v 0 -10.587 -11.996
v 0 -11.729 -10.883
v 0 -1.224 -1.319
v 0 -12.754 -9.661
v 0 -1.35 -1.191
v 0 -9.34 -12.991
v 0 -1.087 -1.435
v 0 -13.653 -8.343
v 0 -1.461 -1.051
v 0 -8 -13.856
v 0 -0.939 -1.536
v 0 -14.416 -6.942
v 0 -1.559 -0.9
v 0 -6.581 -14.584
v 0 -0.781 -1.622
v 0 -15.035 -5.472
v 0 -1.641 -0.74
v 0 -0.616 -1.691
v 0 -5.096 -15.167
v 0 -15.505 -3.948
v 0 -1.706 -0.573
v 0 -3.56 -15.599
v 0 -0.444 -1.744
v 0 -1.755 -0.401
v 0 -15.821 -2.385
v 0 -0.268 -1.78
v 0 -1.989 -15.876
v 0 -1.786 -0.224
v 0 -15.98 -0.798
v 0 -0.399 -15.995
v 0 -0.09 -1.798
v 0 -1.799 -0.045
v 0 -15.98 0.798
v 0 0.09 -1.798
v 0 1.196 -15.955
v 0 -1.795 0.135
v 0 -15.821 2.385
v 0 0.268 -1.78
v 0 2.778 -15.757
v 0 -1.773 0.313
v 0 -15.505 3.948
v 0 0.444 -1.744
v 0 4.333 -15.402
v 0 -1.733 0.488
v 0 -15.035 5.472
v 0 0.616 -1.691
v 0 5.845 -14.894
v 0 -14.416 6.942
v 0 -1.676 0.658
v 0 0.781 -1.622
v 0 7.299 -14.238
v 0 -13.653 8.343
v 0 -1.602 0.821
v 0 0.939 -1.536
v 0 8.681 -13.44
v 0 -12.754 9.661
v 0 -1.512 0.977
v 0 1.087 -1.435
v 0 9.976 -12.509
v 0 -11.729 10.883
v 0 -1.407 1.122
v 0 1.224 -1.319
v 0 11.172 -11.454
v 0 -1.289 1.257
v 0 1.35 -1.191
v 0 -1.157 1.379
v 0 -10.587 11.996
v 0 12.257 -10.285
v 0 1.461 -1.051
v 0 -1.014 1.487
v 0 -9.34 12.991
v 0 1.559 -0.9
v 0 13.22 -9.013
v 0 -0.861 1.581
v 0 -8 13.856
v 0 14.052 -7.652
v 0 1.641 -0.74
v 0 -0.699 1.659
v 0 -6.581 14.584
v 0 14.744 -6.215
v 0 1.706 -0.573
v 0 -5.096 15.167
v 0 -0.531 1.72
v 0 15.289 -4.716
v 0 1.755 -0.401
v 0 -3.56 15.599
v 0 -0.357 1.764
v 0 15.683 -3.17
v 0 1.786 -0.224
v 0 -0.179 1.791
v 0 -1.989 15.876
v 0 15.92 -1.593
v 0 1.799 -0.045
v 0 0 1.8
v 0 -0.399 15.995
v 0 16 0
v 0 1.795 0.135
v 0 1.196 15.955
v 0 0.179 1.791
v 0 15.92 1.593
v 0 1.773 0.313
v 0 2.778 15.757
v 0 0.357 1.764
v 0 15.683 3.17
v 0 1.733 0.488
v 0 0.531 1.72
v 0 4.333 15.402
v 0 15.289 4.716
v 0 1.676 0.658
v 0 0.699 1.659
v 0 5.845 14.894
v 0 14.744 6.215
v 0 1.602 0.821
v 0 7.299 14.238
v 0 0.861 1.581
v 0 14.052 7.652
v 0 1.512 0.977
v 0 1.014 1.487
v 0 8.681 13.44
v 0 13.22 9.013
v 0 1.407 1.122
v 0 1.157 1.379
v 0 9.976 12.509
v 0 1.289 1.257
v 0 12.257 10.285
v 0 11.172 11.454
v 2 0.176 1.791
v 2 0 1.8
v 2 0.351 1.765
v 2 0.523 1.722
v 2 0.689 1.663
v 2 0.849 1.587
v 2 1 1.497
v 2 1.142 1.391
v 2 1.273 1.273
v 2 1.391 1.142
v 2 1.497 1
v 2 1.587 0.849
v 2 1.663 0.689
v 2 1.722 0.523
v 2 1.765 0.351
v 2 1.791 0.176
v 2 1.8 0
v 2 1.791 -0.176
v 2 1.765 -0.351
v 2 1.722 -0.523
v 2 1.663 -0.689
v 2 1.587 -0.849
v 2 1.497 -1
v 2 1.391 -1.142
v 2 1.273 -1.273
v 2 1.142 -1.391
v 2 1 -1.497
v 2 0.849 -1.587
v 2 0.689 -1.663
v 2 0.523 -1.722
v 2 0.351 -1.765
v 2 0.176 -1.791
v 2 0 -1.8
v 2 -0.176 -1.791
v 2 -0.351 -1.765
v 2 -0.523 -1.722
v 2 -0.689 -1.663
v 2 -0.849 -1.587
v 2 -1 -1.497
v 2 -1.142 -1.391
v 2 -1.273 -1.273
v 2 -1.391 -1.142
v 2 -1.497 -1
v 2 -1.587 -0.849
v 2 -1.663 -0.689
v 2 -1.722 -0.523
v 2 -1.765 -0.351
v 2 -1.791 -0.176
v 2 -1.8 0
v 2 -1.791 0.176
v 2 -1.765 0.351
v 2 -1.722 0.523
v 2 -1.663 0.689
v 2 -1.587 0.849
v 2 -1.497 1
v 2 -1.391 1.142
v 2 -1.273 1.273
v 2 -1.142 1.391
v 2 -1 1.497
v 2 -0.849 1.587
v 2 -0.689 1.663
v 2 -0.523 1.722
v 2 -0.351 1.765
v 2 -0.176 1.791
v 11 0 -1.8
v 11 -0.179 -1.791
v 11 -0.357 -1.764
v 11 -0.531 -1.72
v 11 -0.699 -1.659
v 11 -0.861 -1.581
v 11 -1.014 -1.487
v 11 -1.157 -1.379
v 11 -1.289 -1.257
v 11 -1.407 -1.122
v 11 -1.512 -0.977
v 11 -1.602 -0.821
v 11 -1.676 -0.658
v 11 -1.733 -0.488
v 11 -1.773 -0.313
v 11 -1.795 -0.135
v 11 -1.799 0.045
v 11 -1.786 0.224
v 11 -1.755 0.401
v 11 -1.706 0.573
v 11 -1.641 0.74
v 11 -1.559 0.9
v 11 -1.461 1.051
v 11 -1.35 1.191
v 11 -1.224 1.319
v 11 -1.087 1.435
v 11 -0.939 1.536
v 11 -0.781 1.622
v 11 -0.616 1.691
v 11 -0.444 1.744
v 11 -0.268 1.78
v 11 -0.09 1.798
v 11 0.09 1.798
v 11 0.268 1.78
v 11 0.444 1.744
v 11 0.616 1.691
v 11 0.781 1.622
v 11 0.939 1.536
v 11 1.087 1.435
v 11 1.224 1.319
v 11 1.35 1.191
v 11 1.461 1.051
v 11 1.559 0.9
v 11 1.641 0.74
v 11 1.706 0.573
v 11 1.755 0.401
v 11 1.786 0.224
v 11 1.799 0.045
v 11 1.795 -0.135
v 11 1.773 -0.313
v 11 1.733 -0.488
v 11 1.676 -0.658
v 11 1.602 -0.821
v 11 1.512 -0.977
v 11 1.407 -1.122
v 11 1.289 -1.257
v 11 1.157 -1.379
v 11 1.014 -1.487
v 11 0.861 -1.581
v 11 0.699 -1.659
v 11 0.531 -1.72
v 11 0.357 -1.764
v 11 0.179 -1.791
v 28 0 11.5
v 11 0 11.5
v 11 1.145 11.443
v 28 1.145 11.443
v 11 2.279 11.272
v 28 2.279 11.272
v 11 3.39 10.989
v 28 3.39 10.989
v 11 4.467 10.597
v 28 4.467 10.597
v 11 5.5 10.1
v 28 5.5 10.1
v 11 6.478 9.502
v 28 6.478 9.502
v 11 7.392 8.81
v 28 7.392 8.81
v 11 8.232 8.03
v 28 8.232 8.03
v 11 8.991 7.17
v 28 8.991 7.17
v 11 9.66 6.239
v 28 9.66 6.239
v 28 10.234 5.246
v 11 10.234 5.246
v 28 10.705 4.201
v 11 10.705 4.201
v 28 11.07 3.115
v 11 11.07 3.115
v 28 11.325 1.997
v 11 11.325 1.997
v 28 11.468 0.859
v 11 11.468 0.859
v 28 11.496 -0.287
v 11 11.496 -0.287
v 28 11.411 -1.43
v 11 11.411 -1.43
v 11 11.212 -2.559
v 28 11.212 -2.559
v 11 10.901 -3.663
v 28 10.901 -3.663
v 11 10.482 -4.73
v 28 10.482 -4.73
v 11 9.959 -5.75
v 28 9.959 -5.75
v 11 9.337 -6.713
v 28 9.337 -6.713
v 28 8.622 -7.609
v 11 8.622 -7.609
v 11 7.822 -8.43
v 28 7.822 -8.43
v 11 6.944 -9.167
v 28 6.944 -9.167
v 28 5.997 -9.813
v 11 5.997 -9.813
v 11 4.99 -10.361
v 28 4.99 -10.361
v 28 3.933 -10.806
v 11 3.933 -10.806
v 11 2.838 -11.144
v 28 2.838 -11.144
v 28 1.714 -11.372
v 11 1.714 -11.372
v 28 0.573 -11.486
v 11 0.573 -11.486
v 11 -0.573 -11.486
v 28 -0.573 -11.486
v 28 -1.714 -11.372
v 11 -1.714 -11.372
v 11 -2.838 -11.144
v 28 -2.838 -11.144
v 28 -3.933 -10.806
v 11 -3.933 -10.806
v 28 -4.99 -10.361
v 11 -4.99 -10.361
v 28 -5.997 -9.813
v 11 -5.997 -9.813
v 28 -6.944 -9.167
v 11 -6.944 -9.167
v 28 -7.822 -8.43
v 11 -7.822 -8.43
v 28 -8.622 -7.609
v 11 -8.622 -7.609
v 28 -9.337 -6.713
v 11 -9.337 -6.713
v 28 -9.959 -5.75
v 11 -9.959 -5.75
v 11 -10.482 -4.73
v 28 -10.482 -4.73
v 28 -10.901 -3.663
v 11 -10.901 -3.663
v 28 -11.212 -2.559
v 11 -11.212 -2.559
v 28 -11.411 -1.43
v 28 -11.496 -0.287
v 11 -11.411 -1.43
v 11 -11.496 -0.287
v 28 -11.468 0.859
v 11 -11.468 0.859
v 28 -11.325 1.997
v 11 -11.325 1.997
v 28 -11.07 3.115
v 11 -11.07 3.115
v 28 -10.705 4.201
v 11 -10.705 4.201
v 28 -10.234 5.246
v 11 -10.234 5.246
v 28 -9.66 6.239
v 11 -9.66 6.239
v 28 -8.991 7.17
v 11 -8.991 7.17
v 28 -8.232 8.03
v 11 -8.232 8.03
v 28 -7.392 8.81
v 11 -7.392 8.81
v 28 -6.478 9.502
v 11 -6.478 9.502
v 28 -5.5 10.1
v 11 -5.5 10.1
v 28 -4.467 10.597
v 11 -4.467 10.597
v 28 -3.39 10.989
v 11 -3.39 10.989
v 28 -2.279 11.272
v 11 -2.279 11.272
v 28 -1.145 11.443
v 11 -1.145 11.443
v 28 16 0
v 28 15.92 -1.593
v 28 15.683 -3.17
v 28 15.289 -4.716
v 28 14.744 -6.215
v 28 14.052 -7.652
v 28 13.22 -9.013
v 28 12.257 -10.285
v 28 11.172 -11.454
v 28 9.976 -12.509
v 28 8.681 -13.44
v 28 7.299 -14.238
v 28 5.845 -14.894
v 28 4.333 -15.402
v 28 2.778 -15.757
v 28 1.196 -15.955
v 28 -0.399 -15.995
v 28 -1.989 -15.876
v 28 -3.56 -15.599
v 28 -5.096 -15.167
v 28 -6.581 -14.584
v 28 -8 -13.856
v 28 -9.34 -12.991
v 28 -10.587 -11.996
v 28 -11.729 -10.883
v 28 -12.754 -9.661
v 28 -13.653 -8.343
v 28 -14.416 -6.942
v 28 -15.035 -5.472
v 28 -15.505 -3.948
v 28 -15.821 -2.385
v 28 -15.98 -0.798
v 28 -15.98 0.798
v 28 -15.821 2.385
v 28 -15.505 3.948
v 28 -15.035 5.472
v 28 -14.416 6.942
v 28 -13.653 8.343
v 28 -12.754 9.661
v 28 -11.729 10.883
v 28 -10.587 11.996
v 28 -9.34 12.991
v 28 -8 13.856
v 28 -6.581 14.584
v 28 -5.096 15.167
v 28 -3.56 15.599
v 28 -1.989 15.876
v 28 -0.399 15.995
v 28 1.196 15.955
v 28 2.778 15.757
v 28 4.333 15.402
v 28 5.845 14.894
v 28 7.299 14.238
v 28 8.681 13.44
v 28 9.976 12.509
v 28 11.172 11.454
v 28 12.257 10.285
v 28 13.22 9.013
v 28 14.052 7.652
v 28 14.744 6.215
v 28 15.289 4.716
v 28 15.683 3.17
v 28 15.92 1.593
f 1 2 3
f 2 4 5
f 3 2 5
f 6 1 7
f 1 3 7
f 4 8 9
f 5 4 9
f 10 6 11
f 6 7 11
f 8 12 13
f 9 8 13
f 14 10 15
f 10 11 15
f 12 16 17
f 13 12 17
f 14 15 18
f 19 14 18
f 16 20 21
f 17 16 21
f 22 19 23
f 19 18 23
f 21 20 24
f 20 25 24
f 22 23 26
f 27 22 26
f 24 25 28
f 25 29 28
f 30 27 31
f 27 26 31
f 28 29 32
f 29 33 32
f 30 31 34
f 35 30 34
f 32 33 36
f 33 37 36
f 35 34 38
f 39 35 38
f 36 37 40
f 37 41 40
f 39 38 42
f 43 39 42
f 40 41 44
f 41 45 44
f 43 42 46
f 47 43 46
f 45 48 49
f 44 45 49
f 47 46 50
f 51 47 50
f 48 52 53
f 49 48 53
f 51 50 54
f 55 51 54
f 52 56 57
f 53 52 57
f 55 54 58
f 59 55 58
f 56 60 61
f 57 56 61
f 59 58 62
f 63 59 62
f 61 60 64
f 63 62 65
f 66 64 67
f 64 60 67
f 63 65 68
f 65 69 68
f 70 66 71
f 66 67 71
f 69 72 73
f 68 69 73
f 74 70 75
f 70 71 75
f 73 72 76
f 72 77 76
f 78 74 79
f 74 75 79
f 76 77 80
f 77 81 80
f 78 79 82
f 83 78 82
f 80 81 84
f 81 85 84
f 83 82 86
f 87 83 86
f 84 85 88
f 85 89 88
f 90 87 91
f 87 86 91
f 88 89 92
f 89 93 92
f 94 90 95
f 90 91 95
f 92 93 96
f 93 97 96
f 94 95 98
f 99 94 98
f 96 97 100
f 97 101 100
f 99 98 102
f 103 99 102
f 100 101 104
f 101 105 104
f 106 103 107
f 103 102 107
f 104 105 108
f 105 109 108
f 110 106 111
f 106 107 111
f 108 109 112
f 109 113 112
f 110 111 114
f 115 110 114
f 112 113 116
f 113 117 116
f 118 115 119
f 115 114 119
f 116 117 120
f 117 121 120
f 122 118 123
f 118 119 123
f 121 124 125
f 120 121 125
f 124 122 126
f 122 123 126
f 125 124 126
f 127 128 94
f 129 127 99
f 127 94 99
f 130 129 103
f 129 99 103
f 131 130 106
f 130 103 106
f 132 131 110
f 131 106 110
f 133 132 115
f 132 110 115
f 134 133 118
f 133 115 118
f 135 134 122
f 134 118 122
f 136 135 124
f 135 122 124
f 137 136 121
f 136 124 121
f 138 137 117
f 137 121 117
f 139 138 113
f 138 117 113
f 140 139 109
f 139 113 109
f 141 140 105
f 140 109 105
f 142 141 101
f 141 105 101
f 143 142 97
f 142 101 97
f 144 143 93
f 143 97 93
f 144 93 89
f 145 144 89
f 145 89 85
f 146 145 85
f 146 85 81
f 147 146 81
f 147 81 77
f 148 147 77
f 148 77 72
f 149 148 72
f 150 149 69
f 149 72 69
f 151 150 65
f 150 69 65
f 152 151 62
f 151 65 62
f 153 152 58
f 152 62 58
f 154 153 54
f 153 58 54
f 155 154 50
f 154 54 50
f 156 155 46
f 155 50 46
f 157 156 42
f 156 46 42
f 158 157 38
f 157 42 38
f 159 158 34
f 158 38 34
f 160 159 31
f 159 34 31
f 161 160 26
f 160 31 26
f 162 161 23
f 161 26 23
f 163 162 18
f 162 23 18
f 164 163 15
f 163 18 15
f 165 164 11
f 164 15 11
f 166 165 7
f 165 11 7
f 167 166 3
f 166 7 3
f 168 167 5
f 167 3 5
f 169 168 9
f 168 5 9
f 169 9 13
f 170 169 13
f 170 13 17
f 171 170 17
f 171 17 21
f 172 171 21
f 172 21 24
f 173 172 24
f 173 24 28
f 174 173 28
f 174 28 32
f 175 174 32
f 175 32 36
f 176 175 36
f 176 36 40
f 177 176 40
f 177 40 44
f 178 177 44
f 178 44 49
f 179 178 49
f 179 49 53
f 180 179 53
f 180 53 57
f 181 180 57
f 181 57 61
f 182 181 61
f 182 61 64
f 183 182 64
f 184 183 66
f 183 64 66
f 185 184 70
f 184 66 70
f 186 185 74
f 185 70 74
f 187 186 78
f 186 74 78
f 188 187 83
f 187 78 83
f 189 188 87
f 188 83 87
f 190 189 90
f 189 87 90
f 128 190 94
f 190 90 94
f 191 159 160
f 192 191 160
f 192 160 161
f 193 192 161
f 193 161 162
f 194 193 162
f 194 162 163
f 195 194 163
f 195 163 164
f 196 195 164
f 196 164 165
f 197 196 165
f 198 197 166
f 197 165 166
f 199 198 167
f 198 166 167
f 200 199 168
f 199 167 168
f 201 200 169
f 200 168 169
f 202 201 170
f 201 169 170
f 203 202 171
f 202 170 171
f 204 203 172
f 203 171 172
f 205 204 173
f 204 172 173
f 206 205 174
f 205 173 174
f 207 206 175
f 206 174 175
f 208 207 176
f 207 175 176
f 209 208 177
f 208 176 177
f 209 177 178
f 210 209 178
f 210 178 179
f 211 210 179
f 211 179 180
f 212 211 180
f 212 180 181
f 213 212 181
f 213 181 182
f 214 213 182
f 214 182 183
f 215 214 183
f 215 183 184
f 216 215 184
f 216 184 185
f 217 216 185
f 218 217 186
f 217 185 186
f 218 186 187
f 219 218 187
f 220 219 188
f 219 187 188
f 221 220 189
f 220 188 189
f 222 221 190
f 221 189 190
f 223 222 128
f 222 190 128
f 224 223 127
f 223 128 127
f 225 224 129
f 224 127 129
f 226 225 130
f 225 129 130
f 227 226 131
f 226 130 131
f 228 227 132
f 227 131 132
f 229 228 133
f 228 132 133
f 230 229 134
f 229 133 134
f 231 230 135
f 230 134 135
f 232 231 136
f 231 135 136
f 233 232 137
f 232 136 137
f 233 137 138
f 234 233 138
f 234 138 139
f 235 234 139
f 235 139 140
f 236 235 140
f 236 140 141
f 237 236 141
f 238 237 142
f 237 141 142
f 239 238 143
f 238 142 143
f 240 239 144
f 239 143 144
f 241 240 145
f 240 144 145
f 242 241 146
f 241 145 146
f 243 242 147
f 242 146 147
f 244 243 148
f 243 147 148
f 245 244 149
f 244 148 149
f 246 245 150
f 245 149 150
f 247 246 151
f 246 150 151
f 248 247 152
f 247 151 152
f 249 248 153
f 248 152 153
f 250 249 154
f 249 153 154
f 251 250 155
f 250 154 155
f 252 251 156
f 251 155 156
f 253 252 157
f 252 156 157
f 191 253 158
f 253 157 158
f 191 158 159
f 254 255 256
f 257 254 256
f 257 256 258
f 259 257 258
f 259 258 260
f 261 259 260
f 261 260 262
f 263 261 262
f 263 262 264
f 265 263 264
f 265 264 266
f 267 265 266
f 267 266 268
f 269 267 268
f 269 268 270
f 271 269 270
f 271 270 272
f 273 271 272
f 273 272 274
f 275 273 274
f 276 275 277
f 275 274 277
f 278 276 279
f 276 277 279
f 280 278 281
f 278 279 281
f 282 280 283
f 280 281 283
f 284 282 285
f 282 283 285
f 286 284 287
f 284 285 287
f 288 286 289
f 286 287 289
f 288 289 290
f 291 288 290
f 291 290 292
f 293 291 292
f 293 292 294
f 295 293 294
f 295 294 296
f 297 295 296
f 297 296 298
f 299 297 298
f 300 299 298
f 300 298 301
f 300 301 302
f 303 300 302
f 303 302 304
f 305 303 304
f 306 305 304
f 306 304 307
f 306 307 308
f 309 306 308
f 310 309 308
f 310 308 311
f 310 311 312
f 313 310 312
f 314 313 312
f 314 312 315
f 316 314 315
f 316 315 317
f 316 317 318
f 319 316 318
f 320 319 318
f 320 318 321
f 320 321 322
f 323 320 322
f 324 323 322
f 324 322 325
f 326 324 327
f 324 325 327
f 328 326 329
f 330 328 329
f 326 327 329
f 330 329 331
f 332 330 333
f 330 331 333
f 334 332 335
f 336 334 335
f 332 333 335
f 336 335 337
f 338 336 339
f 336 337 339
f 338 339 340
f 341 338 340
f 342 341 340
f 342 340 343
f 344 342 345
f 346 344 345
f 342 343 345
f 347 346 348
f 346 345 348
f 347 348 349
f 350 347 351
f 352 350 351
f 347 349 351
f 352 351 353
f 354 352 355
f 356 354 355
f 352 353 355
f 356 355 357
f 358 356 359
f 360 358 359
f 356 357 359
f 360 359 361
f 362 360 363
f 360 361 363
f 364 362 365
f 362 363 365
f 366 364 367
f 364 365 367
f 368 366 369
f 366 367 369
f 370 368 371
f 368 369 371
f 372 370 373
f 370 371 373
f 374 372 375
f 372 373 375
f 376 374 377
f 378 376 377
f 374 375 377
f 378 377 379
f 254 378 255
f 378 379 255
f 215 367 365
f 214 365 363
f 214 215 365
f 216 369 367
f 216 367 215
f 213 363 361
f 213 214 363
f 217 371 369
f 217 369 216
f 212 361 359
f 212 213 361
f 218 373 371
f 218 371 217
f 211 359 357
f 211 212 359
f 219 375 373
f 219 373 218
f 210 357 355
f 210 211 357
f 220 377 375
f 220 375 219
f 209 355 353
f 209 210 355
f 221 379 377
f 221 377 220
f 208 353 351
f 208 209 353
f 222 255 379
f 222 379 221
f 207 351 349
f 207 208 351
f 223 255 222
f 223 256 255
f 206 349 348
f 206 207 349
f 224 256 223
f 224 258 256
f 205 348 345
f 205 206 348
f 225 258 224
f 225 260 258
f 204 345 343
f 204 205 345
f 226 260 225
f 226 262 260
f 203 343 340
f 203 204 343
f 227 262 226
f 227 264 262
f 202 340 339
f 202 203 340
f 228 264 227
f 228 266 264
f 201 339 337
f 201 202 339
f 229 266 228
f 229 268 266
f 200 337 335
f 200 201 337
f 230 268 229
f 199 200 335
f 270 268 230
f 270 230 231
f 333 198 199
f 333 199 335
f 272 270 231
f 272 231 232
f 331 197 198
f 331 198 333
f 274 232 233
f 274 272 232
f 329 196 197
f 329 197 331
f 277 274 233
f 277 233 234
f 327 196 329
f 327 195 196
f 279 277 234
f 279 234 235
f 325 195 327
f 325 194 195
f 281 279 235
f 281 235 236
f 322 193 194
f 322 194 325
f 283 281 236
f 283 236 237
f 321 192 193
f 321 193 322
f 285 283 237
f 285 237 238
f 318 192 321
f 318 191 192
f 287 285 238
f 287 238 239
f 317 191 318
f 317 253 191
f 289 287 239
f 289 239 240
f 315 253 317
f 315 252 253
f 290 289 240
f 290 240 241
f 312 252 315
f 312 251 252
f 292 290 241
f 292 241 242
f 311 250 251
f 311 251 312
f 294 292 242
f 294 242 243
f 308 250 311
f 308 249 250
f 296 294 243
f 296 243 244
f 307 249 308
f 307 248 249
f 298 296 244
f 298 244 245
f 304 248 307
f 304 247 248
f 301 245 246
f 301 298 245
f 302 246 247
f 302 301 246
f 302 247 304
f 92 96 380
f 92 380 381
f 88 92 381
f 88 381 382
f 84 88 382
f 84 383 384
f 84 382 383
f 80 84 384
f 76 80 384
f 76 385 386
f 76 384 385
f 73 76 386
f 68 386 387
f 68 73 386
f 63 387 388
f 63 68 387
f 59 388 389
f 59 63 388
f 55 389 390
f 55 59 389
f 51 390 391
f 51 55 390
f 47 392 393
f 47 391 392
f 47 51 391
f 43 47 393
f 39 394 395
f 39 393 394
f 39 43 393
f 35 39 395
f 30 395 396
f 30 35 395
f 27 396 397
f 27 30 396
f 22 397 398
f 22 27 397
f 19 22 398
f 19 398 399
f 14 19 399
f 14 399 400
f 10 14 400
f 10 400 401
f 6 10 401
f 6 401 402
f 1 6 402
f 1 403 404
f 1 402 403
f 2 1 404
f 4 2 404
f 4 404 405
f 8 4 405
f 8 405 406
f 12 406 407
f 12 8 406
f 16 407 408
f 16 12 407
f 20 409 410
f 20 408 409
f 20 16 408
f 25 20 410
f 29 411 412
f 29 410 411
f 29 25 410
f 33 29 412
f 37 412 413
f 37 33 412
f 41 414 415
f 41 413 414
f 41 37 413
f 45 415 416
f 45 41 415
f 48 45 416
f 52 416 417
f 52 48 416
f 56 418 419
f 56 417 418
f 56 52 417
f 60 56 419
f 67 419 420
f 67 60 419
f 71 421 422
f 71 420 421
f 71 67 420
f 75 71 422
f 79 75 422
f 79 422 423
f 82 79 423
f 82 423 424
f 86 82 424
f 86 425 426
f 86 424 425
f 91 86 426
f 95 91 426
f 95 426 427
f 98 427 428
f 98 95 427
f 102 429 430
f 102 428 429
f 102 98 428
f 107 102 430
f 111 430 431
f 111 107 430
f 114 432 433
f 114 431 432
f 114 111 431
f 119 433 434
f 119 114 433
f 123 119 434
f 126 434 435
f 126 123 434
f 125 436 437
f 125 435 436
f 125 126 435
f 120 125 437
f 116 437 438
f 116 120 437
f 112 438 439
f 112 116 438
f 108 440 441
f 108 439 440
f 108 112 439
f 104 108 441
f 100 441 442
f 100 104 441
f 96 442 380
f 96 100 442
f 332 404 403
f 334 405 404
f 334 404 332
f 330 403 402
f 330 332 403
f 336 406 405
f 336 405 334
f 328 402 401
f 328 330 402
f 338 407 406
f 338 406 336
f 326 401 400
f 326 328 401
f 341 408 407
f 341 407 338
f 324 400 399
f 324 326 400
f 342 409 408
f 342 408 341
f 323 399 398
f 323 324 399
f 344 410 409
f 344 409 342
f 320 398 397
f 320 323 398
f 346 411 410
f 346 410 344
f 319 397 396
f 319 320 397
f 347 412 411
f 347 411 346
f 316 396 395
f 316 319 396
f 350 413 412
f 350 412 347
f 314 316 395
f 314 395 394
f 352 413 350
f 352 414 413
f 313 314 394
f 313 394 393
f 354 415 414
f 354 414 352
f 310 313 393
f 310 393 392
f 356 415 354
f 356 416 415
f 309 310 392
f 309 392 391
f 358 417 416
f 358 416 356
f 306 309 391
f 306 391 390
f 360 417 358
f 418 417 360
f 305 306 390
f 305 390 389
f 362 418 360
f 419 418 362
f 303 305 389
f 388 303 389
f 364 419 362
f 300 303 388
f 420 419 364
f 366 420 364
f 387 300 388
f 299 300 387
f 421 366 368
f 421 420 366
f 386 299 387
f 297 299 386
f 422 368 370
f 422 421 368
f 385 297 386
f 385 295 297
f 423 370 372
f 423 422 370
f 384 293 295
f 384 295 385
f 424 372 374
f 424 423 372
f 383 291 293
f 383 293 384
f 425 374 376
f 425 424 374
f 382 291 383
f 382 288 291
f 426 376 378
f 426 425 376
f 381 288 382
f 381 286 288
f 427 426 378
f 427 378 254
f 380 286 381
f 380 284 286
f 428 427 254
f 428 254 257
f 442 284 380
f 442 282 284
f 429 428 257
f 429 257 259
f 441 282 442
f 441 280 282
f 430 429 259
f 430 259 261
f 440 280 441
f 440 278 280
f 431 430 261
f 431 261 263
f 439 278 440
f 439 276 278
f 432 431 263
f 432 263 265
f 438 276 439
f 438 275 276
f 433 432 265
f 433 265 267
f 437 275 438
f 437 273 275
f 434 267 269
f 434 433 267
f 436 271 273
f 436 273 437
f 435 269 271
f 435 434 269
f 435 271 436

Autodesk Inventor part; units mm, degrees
ref_plane "YZ Plane" through (0, 0, 0) normal (1, 0, 0) x (0, 1, 0)
ref_plane "XZ Plane" through (0, 0, 0) normal (0, 1, 0) x (-1, 0, 0)
ref_plane "XY Plane" through (0, 0, 0) normal (0, 0, 1) x (1, 0, 0)
sketch "Szkic1" plane through (0, 0, 0) normal (1, 0, 0) x (0, 1, 0)
  circle A0 centre (0, 0) radius 16
  dimension "d0" = 32
extrude "Wyciągnięcie proste1" add sketch "Szkic1" along normal blind 28
sketch "Szkic2" plane through (0, 0, 0) normal (-1, 0, 0) x (0, 0, 1)
  circle A0 centre (0, 0) radius 11.5
  dimension "d3" = 23
extrude "Wyciągnięcie proste2" cut sketch "Szkic2" against normal blind 30.8
sketch "Szkic3" plane through (0, 0, 0) normal (-1, 0, 0) x (0, 0, 1)
  circle A0 centre (0, 0) radius 16 projected
extrude "Wyciągnięcie proste3" add sketch "Szkic3" against normal blind 2
sketch "Szkic4" plane through (0, 0, 0) normal (-1, 0, 0) x (0, 0, 1)
  circle A0 centre (0, 0) radius 1.8
  dimension "d8" = 3.6
extrude "Wyciągnięcie proste4" cut sketch "Szkic4" against normal blind 28
sketch "Szkic5" plane through (2, 0, 0) normal (1, 0, 0) x (0, 0, -1)
  circle A0 centre (0, 0) radius 1.8 projected
  circle A1 centre (0, 0) radius 11.5 projected
extrude "Wyciągnięcie proste5" add sketch "Szkic5" along normal blind 9
properties part number "kolo_tetsowe"
